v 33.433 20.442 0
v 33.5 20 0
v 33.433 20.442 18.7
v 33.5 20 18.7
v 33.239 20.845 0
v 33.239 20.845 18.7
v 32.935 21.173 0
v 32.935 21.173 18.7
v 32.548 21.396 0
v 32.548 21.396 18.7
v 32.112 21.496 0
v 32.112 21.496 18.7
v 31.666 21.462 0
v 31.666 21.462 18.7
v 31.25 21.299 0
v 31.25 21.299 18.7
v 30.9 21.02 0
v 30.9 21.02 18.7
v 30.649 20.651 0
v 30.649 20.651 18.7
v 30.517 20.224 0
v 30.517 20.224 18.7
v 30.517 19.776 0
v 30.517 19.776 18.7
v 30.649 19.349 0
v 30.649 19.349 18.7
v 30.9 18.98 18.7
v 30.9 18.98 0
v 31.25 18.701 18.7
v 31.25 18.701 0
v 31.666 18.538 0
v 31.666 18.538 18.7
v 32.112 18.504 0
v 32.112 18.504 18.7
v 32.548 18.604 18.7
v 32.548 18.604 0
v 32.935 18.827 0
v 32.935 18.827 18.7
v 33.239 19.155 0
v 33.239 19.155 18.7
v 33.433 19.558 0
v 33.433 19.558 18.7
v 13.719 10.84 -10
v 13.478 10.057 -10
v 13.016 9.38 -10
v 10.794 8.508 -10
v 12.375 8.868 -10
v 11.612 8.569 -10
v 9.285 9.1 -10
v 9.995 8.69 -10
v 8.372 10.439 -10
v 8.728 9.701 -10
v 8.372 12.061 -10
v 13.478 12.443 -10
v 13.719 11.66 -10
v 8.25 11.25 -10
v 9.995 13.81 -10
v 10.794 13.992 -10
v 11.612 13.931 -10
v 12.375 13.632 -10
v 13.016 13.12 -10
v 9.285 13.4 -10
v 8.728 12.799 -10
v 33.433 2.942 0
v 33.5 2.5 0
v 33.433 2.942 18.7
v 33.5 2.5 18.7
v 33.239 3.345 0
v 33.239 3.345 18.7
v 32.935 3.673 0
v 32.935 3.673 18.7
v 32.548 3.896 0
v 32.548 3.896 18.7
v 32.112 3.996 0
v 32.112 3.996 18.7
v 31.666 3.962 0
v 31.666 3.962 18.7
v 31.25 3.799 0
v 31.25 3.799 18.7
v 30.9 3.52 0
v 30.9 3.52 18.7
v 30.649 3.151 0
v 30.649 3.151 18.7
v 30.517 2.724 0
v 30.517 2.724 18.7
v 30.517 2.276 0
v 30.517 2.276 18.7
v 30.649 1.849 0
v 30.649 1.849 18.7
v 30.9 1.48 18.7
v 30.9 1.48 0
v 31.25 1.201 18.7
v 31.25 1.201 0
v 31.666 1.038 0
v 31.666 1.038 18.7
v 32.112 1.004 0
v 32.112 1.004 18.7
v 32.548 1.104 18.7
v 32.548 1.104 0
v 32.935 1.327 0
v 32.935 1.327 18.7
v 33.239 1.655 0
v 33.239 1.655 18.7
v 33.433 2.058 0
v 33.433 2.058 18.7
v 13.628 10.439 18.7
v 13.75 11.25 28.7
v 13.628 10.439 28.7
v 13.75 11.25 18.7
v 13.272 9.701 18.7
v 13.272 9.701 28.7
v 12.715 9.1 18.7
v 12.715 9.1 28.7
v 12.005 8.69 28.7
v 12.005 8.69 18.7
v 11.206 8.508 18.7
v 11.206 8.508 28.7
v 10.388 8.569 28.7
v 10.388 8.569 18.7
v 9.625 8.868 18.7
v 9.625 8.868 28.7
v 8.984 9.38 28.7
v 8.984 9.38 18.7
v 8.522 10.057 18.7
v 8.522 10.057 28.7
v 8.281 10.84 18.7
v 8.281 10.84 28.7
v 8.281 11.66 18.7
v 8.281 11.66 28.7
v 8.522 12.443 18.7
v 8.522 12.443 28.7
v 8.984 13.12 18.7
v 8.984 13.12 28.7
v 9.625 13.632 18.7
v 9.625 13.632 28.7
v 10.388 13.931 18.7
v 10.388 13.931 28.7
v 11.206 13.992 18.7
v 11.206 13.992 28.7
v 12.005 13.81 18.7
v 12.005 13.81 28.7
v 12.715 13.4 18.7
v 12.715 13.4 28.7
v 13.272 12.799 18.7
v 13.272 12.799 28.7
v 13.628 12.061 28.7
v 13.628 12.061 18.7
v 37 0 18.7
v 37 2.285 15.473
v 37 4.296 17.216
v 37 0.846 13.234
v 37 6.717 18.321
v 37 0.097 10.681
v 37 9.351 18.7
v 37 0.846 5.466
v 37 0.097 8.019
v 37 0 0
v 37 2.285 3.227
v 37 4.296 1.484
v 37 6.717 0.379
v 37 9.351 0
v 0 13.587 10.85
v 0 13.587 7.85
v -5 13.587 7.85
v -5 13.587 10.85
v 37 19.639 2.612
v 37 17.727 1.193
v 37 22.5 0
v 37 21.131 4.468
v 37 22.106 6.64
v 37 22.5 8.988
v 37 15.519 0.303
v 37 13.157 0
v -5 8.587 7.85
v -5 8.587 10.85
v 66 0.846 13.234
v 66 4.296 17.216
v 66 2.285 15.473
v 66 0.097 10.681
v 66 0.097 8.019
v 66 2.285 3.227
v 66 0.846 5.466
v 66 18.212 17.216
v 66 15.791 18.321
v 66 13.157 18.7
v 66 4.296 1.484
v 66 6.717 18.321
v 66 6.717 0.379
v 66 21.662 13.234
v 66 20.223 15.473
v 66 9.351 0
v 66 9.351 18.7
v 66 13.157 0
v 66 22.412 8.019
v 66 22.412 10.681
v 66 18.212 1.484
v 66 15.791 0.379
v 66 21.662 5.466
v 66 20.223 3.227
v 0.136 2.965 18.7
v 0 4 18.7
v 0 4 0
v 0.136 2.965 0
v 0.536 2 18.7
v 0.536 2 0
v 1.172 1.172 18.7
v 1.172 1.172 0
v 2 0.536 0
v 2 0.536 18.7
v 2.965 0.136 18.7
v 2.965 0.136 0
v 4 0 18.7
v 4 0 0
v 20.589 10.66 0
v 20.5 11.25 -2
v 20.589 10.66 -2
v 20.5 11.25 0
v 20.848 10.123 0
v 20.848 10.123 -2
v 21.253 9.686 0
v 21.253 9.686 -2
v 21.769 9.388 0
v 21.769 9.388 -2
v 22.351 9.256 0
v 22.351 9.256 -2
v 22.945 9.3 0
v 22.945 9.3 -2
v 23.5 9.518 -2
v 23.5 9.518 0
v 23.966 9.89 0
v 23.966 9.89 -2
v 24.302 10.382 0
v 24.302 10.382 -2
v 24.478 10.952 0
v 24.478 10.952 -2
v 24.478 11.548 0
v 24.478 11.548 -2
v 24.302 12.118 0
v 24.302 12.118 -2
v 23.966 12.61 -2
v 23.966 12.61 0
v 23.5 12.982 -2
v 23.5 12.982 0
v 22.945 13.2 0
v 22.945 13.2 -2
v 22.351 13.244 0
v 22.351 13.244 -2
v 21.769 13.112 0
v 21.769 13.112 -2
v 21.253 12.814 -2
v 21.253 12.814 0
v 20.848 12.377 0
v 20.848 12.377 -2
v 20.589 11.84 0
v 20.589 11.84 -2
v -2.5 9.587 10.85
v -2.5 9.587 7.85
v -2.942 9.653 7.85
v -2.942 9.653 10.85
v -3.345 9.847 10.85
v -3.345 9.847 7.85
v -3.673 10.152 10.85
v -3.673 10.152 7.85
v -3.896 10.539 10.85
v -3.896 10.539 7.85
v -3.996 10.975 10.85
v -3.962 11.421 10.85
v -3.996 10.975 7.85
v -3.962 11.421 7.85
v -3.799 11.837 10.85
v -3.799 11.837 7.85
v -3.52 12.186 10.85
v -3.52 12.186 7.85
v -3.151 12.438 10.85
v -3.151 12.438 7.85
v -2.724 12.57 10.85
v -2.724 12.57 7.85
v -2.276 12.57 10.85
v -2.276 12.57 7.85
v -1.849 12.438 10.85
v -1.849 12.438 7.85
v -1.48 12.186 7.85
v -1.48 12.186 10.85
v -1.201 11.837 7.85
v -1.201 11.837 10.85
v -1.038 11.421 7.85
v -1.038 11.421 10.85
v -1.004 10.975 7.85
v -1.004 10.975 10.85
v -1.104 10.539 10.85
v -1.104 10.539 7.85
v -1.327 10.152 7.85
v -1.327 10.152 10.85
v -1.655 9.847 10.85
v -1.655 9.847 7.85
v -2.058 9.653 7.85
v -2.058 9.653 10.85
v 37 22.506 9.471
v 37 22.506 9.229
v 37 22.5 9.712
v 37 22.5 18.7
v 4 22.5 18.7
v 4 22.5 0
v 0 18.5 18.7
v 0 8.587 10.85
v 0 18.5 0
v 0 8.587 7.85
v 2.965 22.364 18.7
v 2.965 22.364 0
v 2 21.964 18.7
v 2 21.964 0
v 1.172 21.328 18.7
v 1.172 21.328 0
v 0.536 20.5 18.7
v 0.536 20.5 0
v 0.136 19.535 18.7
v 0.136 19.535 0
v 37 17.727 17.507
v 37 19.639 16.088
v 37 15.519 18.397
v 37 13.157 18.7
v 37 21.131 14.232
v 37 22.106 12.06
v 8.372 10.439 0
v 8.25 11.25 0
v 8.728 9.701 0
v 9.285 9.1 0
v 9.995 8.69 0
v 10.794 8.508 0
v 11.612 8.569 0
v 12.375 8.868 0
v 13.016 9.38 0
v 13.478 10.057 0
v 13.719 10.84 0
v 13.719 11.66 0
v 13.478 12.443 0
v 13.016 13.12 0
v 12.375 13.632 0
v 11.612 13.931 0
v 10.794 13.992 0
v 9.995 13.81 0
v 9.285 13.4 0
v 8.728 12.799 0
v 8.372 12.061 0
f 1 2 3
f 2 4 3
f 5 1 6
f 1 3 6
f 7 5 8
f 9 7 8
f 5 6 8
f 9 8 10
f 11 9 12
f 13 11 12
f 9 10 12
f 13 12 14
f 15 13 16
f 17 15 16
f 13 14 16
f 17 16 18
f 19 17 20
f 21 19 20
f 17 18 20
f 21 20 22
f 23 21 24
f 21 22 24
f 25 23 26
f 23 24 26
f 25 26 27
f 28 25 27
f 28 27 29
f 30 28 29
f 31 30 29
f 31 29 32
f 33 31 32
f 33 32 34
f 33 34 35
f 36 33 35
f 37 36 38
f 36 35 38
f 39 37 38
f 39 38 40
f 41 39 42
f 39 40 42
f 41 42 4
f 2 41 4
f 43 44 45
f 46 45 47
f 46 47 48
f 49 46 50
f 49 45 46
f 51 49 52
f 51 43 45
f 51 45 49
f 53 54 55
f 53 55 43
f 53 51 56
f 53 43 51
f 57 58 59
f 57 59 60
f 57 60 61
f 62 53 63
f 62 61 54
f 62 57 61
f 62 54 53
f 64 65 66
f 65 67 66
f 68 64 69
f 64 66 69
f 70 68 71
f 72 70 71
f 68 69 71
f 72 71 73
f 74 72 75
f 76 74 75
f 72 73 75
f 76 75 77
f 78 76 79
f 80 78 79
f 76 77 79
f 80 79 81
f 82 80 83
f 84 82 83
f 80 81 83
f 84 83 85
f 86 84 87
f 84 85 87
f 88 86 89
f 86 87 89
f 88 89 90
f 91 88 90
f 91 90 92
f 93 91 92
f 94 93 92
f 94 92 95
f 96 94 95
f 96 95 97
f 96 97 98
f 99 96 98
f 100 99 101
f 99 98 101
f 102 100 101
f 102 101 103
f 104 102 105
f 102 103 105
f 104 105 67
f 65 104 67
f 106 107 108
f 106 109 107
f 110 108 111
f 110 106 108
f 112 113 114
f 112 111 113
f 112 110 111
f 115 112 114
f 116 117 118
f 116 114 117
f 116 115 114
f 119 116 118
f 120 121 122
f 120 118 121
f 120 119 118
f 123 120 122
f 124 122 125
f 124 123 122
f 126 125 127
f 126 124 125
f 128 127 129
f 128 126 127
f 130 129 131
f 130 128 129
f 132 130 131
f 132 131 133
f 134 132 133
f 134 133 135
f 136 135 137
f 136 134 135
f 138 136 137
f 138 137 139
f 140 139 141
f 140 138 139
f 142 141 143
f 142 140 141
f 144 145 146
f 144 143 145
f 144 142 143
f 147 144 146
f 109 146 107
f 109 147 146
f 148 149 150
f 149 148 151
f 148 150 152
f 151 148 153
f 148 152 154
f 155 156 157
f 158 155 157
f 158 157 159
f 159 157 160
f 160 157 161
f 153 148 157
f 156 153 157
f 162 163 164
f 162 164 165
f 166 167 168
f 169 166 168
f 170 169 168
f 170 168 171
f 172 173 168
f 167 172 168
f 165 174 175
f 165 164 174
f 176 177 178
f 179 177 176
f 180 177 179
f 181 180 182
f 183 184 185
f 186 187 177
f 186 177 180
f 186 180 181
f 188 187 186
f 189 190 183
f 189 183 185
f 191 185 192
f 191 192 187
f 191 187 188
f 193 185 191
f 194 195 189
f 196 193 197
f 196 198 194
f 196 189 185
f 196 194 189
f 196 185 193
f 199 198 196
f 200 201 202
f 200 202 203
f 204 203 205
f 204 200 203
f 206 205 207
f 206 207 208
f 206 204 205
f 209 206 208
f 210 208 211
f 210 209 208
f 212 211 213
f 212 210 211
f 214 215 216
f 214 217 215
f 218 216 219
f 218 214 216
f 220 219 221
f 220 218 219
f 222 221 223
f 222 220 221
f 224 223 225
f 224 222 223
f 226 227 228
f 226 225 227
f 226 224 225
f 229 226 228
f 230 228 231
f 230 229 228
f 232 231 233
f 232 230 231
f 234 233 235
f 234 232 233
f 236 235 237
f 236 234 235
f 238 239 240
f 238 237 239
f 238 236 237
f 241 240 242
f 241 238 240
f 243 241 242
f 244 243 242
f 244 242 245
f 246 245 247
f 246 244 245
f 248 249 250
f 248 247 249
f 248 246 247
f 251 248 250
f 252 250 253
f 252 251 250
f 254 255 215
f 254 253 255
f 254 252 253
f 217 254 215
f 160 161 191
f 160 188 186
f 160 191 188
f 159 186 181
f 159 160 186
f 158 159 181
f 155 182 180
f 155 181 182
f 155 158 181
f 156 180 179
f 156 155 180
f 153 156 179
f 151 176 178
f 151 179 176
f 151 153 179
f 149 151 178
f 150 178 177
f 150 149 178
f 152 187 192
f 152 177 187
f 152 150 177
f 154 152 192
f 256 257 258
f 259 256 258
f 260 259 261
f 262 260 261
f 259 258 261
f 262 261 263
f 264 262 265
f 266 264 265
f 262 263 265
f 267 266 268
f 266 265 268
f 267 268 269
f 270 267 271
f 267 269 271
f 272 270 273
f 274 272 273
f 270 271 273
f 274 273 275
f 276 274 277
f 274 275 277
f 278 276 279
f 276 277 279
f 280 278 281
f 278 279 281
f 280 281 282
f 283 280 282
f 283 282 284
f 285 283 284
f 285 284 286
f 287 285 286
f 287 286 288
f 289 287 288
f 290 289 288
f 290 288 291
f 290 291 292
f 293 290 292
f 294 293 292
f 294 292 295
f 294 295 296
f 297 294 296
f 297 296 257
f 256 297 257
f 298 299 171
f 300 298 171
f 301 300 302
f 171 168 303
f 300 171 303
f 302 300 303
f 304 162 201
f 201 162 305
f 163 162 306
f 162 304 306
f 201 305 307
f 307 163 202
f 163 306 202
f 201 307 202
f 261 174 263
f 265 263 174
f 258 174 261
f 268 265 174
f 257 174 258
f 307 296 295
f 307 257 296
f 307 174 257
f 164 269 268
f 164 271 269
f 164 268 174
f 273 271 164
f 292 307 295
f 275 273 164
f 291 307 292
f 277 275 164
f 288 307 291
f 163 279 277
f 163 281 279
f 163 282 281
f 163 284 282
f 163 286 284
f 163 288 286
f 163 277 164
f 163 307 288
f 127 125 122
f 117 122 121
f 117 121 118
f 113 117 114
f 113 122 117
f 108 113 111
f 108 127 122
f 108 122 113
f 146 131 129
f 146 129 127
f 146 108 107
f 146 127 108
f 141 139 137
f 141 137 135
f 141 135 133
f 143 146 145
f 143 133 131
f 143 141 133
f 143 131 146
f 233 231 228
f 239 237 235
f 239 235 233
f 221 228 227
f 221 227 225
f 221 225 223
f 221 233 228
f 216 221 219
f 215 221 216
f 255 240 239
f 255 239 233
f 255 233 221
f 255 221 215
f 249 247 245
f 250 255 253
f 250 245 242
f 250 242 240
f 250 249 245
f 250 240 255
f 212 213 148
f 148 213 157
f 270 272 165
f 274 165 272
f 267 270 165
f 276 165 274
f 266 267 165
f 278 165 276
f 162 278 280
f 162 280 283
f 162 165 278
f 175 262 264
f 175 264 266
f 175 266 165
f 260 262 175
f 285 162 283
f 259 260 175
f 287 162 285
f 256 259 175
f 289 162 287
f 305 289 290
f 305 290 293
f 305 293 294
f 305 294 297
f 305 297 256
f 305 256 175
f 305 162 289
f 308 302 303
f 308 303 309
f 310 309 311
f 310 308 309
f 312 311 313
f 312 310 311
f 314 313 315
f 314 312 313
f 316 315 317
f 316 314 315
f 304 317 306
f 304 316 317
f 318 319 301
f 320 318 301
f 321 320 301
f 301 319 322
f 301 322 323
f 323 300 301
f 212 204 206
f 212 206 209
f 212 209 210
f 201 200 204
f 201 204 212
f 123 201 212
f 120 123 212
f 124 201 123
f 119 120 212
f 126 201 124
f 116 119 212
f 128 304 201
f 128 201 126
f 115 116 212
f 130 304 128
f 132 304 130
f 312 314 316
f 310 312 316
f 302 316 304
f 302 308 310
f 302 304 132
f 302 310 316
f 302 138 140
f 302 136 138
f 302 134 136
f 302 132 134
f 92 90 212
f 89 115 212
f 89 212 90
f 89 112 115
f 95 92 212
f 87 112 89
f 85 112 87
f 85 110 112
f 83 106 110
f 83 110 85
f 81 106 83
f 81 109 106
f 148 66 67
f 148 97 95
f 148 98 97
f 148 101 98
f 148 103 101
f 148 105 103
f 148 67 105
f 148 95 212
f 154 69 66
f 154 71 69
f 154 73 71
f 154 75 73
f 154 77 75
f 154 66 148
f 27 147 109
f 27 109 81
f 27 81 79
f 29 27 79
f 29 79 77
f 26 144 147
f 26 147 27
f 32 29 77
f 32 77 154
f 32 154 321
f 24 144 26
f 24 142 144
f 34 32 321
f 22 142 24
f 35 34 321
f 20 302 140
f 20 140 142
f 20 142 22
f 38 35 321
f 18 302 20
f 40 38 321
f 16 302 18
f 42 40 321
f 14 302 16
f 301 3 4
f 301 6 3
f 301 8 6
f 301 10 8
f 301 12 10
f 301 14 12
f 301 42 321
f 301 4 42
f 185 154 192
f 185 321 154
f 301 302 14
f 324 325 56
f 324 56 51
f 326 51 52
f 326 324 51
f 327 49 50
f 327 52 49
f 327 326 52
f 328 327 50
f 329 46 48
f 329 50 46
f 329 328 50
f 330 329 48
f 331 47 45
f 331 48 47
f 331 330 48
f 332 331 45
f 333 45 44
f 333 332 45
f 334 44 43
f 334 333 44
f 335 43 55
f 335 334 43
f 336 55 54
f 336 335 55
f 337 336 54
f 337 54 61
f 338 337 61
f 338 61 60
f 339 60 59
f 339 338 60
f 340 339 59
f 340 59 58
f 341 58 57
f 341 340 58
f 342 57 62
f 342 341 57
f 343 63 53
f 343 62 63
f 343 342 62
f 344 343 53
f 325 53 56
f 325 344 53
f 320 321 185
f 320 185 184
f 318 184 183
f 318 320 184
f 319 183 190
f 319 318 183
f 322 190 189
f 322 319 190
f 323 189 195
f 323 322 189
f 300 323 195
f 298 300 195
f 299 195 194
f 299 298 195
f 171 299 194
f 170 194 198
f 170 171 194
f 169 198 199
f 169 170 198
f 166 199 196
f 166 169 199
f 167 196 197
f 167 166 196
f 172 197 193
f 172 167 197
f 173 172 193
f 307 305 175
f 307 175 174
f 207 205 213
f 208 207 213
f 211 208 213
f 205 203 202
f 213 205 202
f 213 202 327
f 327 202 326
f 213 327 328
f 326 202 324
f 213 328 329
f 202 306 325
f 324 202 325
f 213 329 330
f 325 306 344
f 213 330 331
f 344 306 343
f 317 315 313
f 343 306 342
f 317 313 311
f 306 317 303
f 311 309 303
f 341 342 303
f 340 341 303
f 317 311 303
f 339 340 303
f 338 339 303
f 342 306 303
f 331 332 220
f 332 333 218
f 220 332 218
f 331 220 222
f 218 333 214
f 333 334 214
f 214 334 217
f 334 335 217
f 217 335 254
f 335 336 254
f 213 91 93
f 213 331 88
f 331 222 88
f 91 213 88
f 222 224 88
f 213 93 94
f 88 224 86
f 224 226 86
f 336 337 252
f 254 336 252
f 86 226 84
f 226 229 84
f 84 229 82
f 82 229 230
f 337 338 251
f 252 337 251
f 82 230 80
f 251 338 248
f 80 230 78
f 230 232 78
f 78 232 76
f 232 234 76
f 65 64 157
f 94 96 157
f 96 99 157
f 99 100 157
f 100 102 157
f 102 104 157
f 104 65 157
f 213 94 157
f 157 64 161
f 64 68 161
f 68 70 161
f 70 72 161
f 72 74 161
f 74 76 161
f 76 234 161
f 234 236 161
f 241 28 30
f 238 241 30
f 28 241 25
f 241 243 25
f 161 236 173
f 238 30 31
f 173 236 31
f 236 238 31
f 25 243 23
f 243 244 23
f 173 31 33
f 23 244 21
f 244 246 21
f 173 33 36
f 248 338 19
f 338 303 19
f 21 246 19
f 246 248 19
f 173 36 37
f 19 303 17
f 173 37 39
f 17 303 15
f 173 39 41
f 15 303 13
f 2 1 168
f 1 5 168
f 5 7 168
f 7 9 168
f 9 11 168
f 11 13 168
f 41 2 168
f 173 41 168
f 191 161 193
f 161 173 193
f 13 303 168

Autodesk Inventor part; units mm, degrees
ref_plane "YZ Plane" through (0, 0, 0) normal (1, 0, 0) x (0, 1, 0)
ref_plane "XZ Plane" through (0, 0, 0) normal (0, 1, 0) x (-1, 0, 0)
ref_plane "XY Plane" through (0, 0, 0) normal (0, 0, 1) x (1, 0, 0)
sketch "Skizze1" plane through (0, 0, 0) normal (0, 0, 1) x (1, 0, 0)
  line L0 (0, 0) -> (37, 0)
  line L1 (37, 0) -> (37, 22.5)
  line L2 (37, 22.5) -> (0, 22.5)
  line L3 (0, 22.5) -> (0, 0)
  dimension "d0" = 37
  dimension "d1" = 22.5
extrude "Extrusion1" add sketch "Skizze1" along normal blind 18.7
sketch "Skizze2" plane through (37, 0, 0) normal (1, 0, 0) x (0, 0, -1)
  line L0 (0, 0) -> (0, 22.5) projected
  line L1 (-9.35, 13.157) -> (-9.35, 9.3514) construction
  line L2 (-18.7, 13.157) -> (-18.7, 9.3514)
  line L3 (0, 9.3514) -> (0, 13.157)
  arc A0 (0, 13.157) -> (-18.7, 13.157) centre (-9.35, 13.157) ccw
  arc A1 (-18.7, 9.3514) -> (0, 9.3514) centre (-9.35, 9.3514) ccw
  point P0 (-9.35, 11.2542)
extrude "Extrusion2" add sketch "Skizze2" along normal blind 29
sketch "Skizze3" plane through (0, 0, 18.7) normal (0, 0, 1) x (1, 0, 0)
  line L0 (37, 22.5) -> (0, 22.5) projected
  line L1 (0, 22.5) -> (0, 0) projected
  circle A0 centre (11, 11.25) radius 2.75
  dimension "d6" = 11
  dimension "d7" = 11.25
  dimension "d21" = 5.5
extrude "Extrusion3" add sketch "Skizze3" along normal blind 10
sketch "Skizze4" plane through (0, 0, 0) normal (0, 0, -1) x (-1, 0, 0)
  line L0 (0, 0) -> (-37, 0) projected
  line L1 (0, 22.5) -> (0, 0) projected
  circle A0 centre (-11, 11.25) radius 2.75
  dimension "d10" = 5.5
  dimension "d11" = 11
  dimension "d12" = 11.25
extrude "Extrusion4" add sketch "Skizze4" along normal blind 10
sketch "Skizze5" plane through (0, 0, 0) normal (0, 0, -1) x (-1, 0, 0)
  line L0 (0, 0) -> (-37, 0) projected
  line L1 (0, 22.5) -> (0, 0) projected
  line L2 (-37, 22.5) -> (0, 22.5) projected
  circle A0 centre (-22.5, 11.25) radius 2
  dimension "d15" = 4
  dimension "d16" = 11.25
  dimension "d17" = 22.5
  dimension "d18" = 11.25
extrude "Extrusion5" add sketch "Skizze5" along normal blind 2
sketch "Skizze6" plane through (0, 0, 0) normal (-1, 0, 0) x (0, 0, 1)
  line L0 (0, 22.5) -> (0, 0) projected
  line L1 (18.7, 22.5) -> (18.7, 0) projected
  line L2 (7.85, 13.5868) -> (10.85, 13.5868)
  line L3 (10.85, 13.5868) -> (10.85, 8.5868)
  line L4 (10.85, 8.5868) -> (7.85, 8.5868)
  line L5 (7.85, 8.5868) -> (7.85, 13.5868)
  line L6 (9.35, 13.5868) -> (9.35, 8.5868)
  dimension "d22" = 3
  dimension "d23" = 5
  dimension "d25" = 18.7
  dimension "d26" = 7.85
  dimension "d27" = 7.85
extrude "Extrusion6" add sketch "Skizze6" along normal blind 5
fillet "Rundung1" radius 4 2 edges at (0, 22.5, 9.35) (0, 0, 9.35)
sketch "Skizze7" plane through (0, 0, 18.7) normal (0, 0, 1) x (1, 0, 0)
  line L0 (4, 0) -> (37, 0) projected
  line L1 (37, 22.5) -> (4, 22.5) projected
  line L2 (0, 18.5) -> (0, 4) projected
  circle A0 centre (32, 20) radius 1.5
  circle A1 centre (32, 2.5) radius 1.5
  point P0 (0, 0)
  dimension "d31" = 2.5
  dimension "d32" = 2.5
  dimension "d33" = 32
  dimension "d34" = 32
  dimension "d35" = 3
  dimension "d36" = 3
extrude "Extrusion7" cut sketch "Skizze7" against normal up to next
hole "Bohrung1" at (-2.5, 11.0868, 10.85) direction (0, 0, -1) diameter 3 end through all
properties part number "Motor_gerade"
